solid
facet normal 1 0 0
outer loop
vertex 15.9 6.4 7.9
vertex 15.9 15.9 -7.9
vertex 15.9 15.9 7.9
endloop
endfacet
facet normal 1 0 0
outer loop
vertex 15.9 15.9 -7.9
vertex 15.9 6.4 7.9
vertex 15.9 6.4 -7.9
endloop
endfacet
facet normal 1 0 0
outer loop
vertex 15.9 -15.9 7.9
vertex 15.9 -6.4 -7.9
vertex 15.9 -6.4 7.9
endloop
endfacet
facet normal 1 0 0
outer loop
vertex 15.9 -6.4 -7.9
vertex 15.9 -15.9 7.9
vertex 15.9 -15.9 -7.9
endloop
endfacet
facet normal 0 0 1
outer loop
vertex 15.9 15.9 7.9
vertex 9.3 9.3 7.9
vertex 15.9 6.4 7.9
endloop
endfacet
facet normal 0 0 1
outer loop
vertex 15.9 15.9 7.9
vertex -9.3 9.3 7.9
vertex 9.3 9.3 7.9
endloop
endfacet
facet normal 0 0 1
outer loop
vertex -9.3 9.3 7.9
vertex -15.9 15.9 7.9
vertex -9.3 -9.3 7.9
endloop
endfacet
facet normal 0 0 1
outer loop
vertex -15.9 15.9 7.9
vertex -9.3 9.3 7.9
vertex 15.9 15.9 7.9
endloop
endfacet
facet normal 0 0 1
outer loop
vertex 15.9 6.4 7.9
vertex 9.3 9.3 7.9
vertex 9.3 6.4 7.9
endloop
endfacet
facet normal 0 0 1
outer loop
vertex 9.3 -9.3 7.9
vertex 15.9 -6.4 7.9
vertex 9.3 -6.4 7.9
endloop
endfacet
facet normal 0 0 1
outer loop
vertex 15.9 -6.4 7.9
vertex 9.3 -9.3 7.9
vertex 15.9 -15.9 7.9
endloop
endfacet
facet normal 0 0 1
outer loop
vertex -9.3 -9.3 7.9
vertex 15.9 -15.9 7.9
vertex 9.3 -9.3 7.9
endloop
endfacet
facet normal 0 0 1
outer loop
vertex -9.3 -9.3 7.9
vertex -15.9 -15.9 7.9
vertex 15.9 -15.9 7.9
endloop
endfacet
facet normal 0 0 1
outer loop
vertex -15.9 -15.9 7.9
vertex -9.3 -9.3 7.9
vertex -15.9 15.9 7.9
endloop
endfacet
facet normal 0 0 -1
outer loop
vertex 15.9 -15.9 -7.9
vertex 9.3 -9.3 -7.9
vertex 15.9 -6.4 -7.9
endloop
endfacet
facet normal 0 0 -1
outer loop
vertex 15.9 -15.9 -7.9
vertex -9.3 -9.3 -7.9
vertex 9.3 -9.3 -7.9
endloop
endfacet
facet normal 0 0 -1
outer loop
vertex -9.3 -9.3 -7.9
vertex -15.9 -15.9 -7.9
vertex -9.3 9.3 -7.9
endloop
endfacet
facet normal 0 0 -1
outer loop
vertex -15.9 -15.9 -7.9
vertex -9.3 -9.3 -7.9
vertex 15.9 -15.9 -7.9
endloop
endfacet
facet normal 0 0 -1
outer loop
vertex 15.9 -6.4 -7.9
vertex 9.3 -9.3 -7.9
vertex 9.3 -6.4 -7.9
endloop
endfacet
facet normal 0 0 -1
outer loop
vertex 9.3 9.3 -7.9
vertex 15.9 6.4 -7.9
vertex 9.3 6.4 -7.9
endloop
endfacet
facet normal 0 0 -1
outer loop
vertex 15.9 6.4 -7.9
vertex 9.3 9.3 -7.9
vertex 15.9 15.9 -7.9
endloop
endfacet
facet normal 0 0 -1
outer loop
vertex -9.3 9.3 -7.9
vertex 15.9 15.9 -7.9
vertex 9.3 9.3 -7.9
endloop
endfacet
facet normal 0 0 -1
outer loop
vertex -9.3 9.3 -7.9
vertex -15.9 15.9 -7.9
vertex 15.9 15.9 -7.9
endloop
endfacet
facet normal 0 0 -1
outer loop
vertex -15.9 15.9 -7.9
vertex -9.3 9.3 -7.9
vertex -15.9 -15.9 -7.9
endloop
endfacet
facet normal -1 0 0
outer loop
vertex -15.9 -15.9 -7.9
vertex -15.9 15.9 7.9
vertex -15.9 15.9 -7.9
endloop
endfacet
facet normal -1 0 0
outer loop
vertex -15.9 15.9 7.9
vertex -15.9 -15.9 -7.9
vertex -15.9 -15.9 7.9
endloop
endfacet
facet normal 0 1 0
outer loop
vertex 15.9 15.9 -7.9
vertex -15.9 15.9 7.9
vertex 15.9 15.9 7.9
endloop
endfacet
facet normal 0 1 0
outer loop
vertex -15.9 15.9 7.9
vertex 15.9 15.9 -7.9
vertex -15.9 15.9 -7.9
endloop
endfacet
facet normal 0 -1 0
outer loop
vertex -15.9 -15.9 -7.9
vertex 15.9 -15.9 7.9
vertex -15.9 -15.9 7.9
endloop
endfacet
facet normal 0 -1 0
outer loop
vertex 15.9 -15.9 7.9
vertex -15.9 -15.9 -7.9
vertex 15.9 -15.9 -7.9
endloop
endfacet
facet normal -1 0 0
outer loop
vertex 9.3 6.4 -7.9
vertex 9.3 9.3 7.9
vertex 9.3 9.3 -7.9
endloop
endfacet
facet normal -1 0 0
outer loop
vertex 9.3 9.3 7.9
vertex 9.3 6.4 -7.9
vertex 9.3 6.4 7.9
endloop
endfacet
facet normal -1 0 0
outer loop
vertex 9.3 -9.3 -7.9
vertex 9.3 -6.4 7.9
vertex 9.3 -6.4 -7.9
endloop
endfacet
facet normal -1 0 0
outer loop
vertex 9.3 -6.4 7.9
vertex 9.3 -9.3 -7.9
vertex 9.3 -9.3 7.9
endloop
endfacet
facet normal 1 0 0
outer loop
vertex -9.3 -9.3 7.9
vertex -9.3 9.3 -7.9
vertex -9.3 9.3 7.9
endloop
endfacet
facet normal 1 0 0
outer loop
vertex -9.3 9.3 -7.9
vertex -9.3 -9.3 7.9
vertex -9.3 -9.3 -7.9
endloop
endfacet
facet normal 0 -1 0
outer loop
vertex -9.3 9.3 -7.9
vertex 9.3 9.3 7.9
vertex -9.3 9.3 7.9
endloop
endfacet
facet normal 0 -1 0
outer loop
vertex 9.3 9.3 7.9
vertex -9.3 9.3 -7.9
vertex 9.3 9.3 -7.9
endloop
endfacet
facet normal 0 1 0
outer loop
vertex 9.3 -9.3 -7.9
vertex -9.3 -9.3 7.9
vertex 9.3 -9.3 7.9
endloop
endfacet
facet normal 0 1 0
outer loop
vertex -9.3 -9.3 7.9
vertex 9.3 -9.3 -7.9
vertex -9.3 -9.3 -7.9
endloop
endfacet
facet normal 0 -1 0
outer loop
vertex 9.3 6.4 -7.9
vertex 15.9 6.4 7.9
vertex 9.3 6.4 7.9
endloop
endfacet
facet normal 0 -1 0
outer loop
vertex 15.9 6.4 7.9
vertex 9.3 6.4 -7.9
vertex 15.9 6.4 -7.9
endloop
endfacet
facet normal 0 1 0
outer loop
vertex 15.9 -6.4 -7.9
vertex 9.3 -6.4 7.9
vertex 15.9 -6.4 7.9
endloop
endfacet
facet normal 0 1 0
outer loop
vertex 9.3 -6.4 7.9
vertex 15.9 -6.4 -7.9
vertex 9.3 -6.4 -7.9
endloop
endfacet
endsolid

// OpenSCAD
$fn=64;

W = 31.8;
H = 31.8;
T = 15.8;

module boss(cx, cy, sx, sy, sz=T){
    translate([cx, cy, 0]) cube([sx, sy, sz], center=true);
}

module c_bracket(){
    difference(){
        union(){
            // Base plate
            cube([W, H, T], center=true);

            // Outer stepped bosses/pads (reinforcements)
            boss(-W/2 + 4.2,  H/2 - 4.2, 8.4, 8.4);
            boss( W/2 - 4.2,  H/2 - 4.2, 8.4, 8.4);
            boss(-W/2 + 4.2, -H/2 + 4.2, 8.4, 8.4);

            // End pads along right side (clamp-like)
            boss( W/2 - 3.2,  0, 6.4, 12.0);
            boss( W/2 - 3.2,  H/2 - 10.0, 6.4, 8.0);
            boss( W/2 - 3.2, -H/2 + 10.0, 6.4, 8.0);

            // Mid rib on left side
            boss(-W/2 + 3.0, 0, 6.0, 10.0);
        }

        // Main inner rectangular opening
        translate([0, 0, 0]) cube([18.6, 18.6, T+0.4], center=true);

        // Create C-shaped gap opening to the right edge
        translate([W/2 - 4.6, 0, 0]) cube([9.2, 12.8, T+0.6], center=true);

        // Inner step transitions (small notches) to make stepped inner corners
        translate([ 18.6/2 - 1.2,  18.6/2 - 1.2, 0]) cube([2.4, 2.4, T+0.6], center=true);
        translate([ 18.6/2 - 1.2, -18.6/2 + 1.2, 0]) cube([2.4, 2.4, T+0.6], center=true);
        translate([-18.6/2 + 1.2,  18.6/2 - 1.2, 0]) cube([2.4, 2.4, T+0.6], center=true);
        translate([-18.6/2 + 1.2, -18.6/2 + 1.2, 0]) cube([2.4, 2.4, T+0.6], center=true);

        // Additional inner step near the C-gap to suggest clamp throat
        translate([18.6/2 + 1.6, 0, 0]) cube([3.2, 8.0, T+0.6], center=true);
        translate([18.6/2 + 3.6, 0, 0]) cube([2.0, 5.2, T+0.6], center=true);
    }
}

c_bracket();
